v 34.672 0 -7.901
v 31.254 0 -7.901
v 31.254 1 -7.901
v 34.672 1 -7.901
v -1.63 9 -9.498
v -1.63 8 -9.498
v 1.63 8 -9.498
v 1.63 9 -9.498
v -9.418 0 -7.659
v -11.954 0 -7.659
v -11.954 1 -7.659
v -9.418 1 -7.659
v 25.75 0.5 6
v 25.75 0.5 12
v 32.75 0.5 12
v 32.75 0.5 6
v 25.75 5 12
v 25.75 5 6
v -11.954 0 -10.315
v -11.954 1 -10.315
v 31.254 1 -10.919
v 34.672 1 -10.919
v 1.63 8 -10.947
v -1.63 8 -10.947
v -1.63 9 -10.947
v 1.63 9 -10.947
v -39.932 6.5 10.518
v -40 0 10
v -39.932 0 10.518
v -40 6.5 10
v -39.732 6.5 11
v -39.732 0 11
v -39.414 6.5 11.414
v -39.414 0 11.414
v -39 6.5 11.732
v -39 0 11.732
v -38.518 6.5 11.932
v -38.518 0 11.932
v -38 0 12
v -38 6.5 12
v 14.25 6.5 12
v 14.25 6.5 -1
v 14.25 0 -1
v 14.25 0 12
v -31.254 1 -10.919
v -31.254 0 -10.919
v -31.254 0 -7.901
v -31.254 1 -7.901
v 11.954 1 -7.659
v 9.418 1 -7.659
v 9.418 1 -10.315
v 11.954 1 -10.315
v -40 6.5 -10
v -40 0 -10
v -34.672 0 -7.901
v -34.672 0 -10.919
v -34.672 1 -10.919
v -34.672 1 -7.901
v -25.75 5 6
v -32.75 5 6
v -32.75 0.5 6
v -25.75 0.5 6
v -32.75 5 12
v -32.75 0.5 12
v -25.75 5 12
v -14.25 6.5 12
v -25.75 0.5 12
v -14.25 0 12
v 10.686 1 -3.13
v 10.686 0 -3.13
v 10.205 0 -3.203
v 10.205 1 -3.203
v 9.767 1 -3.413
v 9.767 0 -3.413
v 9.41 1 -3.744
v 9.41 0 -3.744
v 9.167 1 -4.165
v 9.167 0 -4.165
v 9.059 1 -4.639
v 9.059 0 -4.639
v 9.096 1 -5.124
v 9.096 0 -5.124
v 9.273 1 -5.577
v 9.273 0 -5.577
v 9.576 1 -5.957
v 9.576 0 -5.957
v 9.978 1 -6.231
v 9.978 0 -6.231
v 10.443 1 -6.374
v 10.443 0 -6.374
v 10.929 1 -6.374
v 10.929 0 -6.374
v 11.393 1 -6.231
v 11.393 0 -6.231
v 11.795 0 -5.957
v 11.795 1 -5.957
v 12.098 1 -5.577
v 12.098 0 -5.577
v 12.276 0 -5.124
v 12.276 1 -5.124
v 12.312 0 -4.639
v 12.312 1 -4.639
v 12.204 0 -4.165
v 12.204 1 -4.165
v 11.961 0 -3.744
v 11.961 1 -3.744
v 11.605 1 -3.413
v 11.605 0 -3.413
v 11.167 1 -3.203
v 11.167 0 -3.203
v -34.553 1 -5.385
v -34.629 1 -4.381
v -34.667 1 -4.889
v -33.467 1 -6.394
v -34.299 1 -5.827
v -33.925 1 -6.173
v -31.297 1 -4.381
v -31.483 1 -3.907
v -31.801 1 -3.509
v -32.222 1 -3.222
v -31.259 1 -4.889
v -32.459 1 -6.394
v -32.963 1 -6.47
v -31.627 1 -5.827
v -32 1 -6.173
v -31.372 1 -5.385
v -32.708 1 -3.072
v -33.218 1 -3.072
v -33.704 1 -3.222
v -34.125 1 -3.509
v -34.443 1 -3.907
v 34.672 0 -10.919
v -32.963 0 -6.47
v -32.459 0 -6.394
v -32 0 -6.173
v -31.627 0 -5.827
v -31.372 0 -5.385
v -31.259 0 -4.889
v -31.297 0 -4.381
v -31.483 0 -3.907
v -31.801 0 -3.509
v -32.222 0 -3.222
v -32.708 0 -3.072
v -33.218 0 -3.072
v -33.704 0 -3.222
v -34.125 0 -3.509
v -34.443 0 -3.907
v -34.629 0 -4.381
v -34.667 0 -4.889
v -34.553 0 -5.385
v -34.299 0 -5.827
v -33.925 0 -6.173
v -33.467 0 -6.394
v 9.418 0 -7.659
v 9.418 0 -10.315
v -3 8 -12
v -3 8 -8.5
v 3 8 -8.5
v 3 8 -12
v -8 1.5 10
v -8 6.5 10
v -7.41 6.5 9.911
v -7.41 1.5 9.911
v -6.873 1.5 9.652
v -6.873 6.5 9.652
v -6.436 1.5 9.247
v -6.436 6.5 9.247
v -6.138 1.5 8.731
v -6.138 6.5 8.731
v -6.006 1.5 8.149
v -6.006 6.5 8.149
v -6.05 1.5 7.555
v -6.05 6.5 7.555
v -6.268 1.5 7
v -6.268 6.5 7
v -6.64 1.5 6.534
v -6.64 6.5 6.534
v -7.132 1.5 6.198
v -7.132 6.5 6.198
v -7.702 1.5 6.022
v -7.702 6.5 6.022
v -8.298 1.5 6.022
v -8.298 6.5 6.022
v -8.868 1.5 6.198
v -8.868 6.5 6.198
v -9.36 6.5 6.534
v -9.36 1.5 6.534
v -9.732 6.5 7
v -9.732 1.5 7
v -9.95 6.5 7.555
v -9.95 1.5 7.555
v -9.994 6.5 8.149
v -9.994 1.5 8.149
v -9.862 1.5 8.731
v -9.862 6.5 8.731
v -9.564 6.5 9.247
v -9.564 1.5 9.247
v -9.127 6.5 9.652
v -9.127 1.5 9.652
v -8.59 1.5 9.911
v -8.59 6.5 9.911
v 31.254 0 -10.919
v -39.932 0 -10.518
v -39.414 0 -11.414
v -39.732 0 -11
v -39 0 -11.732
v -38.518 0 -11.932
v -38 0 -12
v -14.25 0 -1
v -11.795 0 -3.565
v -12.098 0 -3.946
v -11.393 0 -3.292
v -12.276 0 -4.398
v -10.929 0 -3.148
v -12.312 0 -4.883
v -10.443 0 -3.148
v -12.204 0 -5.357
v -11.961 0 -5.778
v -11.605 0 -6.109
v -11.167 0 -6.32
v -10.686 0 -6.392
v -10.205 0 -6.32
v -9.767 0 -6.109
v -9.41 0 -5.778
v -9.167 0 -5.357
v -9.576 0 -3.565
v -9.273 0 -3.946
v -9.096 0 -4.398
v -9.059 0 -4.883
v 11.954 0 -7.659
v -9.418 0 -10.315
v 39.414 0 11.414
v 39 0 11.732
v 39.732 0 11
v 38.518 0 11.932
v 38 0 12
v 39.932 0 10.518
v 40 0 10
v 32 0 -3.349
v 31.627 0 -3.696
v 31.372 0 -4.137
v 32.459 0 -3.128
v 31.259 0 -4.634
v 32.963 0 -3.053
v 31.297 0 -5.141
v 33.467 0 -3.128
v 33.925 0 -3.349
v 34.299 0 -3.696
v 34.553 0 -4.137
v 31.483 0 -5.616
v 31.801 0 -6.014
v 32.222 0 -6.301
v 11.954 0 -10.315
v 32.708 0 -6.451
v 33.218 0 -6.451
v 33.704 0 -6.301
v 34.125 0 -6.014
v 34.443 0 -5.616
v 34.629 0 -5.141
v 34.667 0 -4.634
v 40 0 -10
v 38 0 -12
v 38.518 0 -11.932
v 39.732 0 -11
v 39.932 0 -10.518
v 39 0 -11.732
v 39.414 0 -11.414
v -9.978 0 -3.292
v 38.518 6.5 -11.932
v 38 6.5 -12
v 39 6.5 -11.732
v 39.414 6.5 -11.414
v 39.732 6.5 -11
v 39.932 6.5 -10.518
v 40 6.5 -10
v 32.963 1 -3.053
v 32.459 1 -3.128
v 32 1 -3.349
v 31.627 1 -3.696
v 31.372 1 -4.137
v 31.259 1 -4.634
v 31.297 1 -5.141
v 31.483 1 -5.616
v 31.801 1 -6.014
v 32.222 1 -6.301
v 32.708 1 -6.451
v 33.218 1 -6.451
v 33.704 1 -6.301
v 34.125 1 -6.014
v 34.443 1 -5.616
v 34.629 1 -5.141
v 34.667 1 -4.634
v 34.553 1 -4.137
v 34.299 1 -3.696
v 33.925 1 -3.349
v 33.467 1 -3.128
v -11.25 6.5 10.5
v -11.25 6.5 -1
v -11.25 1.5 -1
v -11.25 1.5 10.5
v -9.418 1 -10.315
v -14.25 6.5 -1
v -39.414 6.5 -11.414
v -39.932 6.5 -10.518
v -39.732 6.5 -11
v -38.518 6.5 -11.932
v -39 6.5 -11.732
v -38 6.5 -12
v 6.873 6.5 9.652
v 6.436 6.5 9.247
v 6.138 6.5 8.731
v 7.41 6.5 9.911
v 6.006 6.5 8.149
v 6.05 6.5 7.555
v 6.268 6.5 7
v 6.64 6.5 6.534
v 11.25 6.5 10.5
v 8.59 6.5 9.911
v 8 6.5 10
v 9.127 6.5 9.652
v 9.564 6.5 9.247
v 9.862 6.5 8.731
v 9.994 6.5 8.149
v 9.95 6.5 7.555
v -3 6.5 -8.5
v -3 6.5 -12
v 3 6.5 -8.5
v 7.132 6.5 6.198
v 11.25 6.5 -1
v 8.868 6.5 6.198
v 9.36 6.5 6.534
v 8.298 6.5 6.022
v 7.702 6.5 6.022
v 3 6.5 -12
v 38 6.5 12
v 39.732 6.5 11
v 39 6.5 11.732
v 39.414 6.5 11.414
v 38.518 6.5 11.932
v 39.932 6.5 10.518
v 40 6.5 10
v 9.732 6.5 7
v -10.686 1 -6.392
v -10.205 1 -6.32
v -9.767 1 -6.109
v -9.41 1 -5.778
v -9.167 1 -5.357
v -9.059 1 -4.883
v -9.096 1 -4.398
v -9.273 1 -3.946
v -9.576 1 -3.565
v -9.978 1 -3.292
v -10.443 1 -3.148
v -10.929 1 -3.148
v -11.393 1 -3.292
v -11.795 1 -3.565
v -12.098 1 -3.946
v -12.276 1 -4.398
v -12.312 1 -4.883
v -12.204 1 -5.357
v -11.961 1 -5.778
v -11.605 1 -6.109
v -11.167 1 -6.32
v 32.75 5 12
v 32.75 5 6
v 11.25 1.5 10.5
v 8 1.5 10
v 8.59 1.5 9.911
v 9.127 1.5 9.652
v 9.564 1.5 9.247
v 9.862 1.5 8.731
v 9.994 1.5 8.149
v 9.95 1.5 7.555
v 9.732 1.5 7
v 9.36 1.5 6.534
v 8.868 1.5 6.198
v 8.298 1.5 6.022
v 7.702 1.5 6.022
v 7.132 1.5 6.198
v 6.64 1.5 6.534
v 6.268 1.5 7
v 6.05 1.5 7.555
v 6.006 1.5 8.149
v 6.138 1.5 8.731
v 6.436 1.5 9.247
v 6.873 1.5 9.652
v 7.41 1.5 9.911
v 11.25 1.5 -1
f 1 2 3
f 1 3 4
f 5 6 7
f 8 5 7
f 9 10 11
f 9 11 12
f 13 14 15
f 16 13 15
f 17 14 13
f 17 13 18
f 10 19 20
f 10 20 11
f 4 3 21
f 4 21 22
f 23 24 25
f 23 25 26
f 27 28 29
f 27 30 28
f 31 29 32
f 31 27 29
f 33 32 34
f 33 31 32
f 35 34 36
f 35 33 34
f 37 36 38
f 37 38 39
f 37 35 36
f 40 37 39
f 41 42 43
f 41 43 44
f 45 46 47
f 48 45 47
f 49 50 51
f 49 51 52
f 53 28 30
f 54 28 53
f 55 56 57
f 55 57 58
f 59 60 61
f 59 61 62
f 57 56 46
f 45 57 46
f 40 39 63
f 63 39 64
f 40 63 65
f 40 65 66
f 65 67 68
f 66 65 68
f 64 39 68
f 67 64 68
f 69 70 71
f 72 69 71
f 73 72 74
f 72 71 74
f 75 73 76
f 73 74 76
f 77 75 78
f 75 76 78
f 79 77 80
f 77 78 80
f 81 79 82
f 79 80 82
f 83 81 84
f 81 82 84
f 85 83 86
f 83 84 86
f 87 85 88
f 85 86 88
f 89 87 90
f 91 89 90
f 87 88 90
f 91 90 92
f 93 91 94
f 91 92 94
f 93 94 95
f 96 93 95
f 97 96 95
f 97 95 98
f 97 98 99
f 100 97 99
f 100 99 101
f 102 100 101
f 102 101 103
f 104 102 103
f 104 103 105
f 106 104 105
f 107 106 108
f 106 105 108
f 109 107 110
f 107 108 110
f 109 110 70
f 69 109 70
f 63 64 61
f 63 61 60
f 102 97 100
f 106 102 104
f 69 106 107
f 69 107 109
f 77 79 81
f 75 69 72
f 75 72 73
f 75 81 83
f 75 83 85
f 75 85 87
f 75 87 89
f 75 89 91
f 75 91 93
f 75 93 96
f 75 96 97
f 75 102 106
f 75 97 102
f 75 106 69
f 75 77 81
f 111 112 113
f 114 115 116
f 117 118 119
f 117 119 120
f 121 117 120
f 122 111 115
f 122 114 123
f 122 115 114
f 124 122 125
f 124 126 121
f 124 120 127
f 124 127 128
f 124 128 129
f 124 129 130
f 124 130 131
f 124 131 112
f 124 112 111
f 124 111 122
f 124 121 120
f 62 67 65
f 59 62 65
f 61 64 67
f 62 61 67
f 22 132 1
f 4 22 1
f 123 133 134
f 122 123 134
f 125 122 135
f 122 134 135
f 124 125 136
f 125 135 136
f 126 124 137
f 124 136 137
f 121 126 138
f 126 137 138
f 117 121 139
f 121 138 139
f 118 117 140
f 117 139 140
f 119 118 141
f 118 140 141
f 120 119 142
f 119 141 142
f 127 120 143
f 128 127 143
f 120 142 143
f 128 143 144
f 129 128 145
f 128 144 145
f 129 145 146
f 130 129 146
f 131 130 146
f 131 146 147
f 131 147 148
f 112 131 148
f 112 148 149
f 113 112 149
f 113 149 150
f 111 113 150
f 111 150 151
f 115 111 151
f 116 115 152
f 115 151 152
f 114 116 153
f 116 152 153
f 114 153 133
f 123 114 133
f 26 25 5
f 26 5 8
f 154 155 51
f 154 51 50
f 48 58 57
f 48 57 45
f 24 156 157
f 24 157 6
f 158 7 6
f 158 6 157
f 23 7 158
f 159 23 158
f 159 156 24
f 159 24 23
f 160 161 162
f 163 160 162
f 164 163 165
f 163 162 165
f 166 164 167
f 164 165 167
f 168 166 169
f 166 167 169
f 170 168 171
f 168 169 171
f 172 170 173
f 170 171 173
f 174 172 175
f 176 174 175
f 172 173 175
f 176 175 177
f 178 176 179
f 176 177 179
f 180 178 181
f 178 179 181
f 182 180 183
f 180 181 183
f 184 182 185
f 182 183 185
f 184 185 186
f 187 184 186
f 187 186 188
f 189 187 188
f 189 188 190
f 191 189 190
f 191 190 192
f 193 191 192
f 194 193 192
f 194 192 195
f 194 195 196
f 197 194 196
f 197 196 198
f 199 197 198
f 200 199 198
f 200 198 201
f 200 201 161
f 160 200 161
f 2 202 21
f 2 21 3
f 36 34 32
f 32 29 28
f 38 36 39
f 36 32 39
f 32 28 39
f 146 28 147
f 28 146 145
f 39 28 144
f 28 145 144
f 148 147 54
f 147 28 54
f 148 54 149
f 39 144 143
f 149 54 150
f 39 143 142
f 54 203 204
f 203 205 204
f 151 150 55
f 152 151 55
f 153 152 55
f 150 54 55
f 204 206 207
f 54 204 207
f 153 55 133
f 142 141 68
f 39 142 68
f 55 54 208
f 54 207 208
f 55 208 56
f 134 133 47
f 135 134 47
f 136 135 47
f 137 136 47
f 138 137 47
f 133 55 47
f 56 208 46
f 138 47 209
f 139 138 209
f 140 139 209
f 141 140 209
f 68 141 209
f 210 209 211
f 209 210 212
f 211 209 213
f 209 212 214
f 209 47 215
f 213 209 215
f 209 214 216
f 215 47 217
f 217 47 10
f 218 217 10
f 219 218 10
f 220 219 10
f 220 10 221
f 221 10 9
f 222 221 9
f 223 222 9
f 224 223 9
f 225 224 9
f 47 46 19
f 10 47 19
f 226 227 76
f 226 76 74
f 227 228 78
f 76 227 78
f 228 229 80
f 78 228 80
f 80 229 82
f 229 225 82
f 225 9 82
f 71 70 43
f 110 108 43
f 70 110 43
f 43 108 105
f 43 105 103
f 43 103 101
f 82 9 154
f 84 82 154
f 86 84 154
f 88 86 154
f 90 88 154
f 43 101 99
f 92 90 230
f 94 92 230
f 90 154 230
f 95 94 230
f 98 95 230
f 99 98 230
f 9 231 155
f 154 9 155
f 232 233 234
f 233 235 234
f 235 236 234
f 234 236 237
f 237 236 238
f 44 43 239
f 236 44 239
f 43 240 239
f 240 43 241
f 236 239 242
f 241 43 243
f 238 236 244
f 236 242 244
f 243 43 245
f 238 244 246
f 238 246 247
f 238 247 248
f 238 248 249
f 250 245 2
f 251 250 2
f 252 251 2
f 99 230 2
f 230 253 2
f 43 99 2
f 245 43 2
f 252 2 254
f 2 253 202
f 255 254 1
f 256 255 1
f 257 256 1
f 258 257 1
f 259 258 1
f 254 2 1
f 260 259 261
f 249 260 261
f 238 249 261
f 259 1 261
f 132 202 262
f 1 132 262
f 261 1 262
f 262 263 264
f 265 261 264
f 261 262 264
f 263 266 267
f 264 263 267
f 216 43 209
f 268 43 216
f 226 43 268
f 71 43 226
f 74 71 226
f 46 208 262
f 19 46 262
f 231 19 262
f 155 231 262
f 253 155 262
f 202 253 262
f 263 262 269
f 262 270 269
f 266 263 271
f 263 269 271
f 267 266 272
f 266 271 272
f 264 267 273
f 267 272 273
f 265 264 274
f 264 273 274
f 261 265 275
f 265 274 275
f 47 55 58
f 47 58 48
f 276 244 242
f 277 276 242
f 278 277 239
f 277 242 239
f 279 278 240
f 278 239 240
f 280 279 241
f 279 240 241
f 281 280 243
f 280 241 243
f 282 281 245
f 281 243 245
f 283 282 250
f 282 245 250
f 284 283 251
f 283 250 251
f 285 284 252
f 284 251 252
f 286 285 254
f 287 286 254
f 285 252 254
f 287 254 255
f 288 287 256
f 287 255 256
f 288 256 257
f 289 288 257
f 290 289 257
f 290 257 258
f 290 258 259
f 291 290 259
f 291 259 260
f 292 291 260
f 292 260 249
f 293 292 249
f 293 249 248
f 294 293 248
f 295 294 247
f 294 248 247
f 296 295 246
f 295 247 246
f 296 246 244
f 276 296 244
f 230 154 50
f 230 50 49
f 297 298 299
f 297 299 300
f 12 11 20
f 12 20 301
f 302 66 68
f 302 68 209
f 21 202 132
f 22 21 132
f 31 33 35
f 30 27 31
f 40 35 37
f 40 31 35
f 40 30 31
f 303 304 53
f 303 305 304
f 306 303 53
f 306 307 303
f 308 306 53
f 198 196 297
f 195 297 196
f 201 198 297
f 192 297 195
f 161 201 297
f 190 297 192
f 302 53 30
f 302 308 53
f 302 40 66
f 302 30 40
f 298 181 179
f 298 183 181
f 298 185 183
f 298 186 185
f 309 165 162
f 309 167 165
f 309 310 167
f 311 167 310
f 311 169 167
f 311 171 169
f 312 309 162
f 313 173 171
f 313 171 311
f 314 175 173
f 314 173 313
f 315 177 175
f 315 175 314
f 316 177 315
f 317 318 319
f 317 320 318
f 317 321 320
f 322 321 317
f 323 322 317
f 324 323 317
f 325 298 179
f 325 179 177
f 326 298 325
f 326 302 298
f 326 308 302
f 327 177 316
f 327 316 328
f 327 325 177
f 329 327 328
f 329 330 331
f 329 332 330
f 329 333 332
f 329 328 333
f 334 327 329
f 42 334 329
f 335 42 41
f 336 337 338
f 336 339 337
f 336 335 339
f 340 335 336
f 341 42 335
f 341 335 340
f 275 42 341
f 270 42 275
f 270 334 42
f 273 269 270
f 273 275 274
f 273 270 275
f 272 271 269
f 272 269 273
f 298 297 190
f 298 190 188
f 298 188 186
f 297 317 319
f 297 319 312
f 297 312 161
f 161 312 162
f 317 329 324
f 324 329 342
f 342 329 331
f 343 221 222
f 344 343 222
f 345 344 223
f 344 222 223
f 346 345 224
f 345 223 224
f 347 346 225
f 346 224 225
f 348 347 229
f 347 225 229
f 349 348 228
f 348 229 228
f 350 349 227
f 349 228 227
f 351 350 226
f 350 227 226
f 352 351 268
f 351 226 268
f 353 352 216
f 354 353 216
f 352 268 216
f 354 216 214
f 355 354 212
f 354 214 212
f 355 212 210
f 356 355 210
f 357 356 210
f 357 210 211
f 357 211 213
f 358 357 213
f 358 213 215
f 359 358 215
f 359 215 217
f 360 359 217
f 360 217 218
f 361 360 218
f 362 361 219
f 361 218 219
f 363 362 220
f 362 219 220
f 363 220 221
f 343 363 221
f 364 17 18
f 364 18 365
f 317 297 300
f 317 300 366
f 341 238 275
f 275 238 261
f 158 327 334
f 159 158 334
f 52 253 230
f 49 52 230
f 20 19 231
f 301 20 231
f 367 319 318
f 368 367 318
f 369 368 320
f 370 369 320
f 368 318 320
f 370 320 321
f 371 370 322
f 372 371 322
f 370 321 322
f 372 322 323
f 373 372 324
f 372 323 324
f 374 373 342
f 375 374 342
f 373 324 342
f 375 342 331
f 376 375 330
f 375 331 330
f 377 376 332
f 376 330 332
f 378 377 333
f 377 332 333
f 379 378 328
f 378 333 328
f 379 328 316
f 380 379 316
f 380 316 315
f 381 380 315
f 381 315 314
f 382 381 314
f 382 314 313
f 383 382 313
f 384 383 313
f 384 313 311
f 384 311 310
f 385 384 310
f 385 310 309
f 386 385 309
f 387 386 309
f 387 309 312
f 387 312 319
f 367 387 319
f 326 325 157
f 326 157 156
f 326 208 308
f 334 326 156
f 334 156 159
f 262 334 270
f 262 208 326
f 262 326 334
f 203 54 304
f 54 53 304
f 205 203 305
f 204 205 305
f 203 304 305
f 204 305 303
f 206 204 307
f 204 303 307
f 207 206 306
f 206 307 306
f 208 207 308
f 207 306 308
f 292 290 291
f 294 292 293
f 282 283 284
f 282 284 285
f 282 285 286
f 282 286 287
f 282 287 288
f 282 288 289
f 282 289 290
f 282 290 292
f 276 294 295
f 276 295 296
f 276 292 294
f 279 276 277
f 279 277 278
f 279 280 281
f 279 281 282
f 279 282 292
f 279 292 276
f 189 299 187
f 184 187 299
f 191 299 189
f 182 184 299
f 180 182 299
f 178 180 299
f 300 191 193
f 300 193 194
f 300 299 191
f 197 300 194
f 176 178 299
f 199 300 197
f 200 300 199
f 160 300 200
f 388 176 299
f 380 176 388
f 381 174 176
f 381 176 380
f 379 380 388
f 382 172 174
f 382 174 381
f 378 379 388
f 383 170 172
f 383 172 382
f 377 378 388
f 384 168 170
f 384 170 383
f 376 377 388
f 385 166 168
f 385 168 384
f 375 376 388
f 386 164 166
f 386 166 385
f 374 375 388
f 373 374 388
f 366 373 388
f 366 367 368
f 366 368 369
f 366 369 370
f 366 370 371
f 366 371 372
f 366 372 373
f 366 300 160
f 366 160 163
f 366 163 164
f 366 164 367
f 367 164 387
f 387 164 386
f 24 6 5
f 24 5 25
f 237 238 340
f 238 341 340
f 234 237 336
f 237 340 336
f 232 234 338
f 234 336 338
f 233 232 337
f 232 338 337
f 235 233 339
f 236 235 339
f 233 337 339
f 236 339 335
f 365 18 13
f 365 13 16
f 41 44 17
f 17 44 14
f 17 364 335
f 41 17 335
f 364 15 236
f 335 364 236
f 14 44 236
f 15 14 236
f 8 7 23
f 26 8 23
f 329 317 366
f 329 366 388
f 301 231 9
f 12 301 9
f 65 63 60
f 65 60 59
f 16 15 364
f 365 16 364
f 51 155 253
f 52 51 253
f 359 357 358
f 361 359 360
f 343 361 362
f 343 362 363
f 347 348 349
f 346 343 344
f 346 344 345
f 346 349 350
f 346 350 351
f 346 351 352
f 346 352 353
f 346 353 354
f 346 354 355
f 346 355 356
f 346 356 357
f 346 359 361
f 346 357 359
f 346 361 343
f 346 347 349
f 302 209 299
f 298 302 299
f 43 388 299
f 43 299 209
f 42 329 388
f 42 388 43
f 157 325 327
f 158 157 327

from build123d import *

# Parameters (mm, degrees)
SKETCH_1_W          = 80
SKETCH_1_H          = 24
EXTRUDE_1_DEPTH     = 6.5
SKETCH_2_W          = 6
SKETCH_2_H          = 3.5
EXTRUDE_2_DEPTH     = 1.5
SKETCH_3_W          = 3.260064366
SKETCH_3_H          = 1.448917496
EXTRUDE_3_DEPTH     = 1
SKETCH_4_R          = 2
CUT_EXTRUDE_1_DEPTH = 43.264050918
SKETCH_5_W          = 7
SKETCH_5_H          = 4.5
CUT_EXTRUDE_2_DEPTH = 6
SKETCH_6_W          = 28.5
SKETCH_6_H          = 13
CUT_EXTRUDE_3_DEPTH = 1.5
SKETCH_7_R          = 1.70863254
SKETCH_7_R_2        = 1.631149792
SKETCH_7_W          = 3.41726508
SKETCH_7_H          = 3.018578117
SKETCH_7_W_2        = 2.535605619
SKETCH_7_H_2        = 2.656348743
CUT_EXTRUDE_4_DEPTH = 1
FILLET_1_R          = 2


with BuildPart() as part:
    # 草图1 → 凸台-拉伸1 (new body)
    with BuildSketch(Plane(origin=(0, 0, 0), x_dir=(1, 0, 0), z_dir=(0, 1, 0))):
        Rectangle(SKETCH_1_W, SKETCH_1_H)
    extrude(amount=EXTRUDE_1_DEPTH)

    # 草图2 → 凸台-拉伸2 (add)
    with BuildSketch(Plane(origin=(0, 6.5, 0), x_dir=(1, 0, 0), z_dir=(0, 1, 0))):
        with Locations((0, 10.25)):
            Rectangle(SKETCH_2_W, SKETCH_2_H)
    extrude(amount=EXTRUDE_2_DEPTH)

    # 草图3 → 凸台-拉伸3 (add)
    with BuildSketch(Plane(origin=(0, 8, 0), x_dir=(1, 0, 0), z_dir=(0, 1, 0))):
        with Locations((0, 10.22231269)):
            Rectangle(SKETCH_3_W, SKETCH_3_H)
    extrude(amount=EXTRUDE_3_DEPTH)

    # 草图4 → 切除-拉伸1 (cut, through all)
    with BuildSketch(Plane(origin=(0, 6.5, 0), x_dir=(1, 0, 0), z_dir=(0, 1, 0))):
        with Locations(Location((-8, -8, 0), (0, 0, 270))):
            Circle(SKETCH_4_R)
        with Locations(Location((8, -8, 0), (0, 0, 270))):
            Circle(SKETCH_4_R)
        Polygon((-14.25, -12), (-14.25, 1), (-11.25, 1), (-11.25, -10.5), (11.25, -10.5), (11.25, 1), (14.25, 1), (14.25, -12), (11.25, -12), (-11.25, -12), align=None)
    extrude(amount=-CUT_EXTRUDE_1_DEPTH, mode=Mode.SUBTRACT)

    # 草图5 → 切除-拉伸2 (cut)
    with BuildSketch(Plane.XY.offset(12)):
        with Locations((-29.25, 2.75)):
            Rectangle(SKETCH_5_W, SKETCH_5_H)
        with Locations((29.25, 2.75)):
            Rectangle(SKETCH_5_W, SKETCH_5_H)
    extrude(amount=-CUT_EXTRUDE_2_DEPTH, mode=Mode.SUBTRACT)

    # 草图6 → 切除-拉伸3 (cut)
    with BuildSketch(Plane.XZ):
        with Locations((0, 5.5)):
            Rectangle(SKETCH_6_W, SKETCH_6_H)
    extrude(amount=-CUT_EXTRUDE_3_DEPTH, mode=Mode.SUBTRACT)

    # 草图7 → 切除-拉伸4 (cut)
    with BuildSketch(Plane.XZ):
        with Locations(Location((-32.962873036, -4.761215966, 0), (0, 0, 270))):
            Circle(SKETCH_7_R)
        with Locations(Location((-10.685766534, -4.761215966, 0), (0, 0, 270))):
            Circle(SKETCH_7_R_2)
        with Locations(Location((10.685766534, -4.761215966, 0), (0, 0, 90))):
            Circle(SKETCH_7_R_2)
        with Locations(Location((32.962873036, -4.761215966, 0), (0, 0, 90))):
            Circle(SKETCH_7_R)
        with Locations((-32.962873036, -9.409826265)):
            Rectangle(SKETCH_7_W, SKETCH_7_H)
        with Locations((-10.685766534, -8.98722533)):
            Rectangle(SKETCH_7_W_2, SKETCH_7_H_2)
        with Locations((10.685766534, -8.98722533)):
            Rectangle(SKETCH_7_W_2, SKETCH_7_H_2)
        with Locations((32.962873036, -9.409826265)):
            Rectangle(SKETCH_7_W, SKETCH_7_H)
    extrude(amount=-CUT_EXTRUDE_4_DEPTH, mode=Mode.SUBTRACT)

    # 圆角1
    fillet_1_edges = [part.edges().sort_by_distance(p)[0] for p in [
        (40, 3.25, 12),
        (-40, 3.25, 12),
        (-40, 3.25, -12),
        (40, 3.25, -12),
    ]]
    fillet(fillet_1_edges, radius=FILLET_1_R)


solid = part.part
